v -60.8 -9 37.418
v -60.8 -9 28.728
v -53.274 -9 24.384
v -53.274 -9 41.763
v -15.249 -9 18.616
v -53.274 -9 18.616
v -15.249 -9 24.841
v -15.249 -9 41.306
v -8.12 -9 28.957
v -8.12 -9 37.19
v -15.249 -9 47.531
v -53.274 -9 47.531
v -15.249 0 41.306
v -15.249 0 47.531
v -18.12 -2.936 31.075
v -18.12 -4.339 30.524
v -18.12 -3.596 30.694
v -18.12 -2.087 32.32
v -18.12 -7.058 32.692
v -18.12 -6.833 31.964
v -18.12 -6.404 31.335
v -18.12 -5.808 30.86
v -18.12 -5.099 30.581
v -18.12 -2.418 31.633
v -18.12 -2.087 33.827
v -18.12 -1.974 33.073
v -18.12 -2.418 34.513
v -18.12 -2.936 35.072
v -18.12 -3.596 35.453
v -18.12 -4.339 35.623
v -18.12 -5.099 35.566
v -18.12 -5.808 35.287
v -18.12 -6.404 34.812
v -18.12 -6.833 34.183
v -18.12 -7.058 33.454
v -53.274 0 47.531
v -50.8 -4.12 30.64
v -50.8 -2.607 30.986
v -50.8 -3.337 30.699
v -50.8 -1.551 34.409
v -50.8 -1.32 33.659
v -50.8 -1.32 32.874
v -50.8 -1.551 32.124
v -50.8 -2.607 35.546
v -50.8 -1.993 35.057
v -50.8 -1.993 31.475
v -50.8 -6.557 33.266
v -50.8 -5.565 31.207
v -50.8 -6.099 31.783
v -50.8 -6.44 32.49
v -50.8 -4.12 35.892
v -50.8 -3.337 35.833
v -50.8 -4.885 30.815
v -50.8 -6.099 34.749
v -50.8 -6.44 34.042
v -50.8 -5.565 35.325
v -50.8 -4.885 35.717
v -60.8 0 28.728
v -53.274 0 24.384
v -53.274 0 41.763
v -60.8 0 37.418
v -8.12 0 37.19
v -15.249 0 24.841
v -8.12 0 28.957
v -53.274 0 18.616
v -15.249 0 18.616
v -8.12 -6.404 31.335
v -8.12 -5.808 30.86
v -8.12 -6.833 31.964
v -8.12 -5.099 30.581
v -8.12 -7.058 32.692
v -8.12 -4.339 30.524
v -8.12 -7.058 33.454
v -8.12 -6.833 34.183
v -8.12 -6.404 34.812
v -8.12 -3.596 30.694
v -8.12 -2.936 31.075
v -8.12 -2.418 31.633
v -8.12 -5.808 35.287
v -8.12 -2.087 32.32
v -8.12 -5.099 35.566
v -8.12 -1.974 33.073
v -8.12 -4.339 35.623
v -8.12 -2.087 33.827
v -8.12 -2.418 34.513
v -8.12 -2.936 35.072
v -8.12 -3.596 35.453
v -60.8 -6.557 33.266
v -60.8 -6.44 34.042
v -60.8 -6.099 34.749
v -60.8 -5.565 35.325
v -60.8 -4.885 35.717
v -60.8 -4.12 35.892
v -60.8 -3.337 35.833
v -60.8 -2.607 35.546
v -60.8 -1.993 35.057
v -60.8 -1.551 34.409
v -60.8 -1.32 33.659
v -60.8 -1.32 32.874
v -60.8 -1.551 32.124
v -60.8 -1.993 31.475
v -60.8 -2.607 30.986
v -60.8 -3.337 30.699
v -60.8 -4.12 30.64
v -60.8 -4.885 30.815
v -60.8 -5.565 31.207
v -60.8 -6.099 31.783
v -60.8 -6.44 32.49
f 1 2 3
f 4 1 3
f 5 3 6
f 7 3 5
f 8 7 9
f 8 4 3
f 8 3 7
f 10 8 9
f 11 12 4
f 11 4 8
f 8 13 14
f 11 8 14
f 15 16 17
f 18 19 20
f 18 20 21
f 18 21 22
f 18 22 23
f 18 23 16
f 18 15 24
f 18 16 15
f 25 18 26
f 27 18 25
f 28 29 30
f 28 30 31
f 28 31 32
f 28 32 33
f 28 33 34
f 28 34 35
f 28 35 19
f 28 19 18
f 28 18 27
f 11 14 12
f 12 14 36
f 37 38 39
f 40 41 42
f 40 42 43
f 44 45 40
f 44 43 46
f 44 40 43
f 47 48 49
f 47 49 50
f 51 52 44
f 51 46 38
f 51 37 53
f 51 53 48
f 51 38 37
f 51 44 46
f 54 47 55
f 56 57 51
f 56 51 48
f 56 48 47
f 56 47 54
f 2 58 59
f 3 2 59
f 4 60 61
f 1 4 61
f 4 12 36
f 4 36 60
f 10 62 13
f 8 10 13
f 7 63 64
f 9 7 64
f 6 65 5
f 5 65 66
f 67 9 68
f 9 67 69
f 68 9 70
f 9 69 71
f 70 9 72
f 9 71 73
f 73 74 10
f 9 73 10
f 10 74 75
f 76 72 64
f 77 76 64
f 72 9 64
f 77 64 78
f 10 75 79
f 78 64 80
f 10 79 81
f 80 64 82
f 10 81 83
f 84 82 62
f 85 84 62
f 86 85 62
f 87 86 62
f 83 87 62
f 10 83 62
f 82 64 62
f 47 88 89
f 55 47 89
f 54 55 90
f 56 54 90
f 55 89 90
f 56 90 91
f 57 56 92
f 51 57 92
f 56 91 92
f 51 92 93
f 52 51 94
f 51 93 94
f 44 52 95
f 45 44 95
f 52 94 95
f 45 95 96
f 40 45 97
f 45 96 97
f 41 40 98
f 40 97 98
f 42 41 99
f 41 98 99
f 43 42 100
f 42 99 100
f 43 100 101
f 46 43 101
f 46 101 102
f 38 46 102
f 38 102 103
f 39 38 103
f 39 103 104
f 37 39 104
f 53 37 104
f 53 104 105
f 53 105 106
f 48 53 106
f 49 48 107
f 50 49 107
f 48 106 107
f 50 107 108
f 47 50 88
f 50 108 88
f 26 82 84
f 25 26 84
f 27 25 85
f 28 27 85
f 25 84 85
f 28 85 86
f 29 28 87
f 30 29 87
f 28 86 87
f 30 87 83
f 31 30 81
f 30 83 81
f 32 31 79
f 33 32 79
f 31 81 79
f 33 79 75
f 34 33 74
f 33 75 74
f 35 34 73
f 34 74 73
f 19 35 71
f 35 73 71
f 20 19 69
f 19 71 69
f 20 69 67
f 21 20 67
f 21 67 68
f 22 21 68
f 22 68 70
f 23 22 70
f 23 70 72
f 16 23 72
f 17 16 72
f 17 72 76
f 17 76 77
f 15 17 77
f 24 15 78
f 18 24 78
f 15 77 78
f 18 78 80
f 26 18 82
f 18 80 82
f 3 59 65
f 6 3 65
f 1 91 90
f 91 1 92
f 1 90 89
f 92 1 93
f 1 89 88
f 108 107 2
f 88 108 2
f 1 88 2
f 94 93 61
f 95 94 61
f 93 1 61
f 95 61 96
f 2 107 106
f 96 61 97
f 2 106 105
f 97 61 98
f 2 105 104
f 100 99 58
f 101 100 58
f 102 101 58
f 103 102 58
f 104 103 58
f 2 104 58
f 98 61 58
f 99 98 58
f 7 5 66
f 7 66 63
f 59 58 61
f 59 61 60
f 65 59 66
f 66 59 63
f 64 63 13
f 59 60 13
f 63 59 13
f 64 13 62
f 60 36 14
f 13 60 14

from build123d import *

# Parameters (mm, degrees)
F1_DEPTH = 9
F2_R     = 2.5563686672
F4_DEPTH = 10
F3_R     = 2.6331489766
F5_DEPTH = 10


with BuildPart() as f1:
    # F0 (on Front) → F1 (new body)
    with BuildSketch(Plane.XZ):
        Polygon((-15.2494329959, 47.5306976587), (-53.273987025, 47.5306976587), (-53.273987025, 41.7633611672), (-45.7482971251, 37.4184020777), (-45.7482971251, 28.7284838985), (-53.273987025, 24.383524809), (-53.273987025, 18.6161883175), (-15.2494329959, 18.6161883175), (-15.2494329959, 24.8408854145), (-22.3790369928, 28.9571642013), (-22.3790369928, 37.1897217749), (-15.2494329959, 41.3060005617), align=None)
        Polygon((-45.7482971251, 37.4184020777), (-53.273987025, 41.7633611672), (-53.273987025, 24.383524809), (-45.7482971251, 28.7284838985), align=None)
        Polygon((-53.273987025, 24.383524809), (-53.273987025, 41.7633611672), (-60.7996769249, 37.4184020777), (-60.7996769249, 28.7284838985), align=None)
        Polygon((-8.119828999, 37.1897217749), (-15.2494329959, 41.3060005617), (-15.2494329959, 24.8408854145), (-8.119828999, 28.9571642013), align=None)
        Polygon((-15.2494329959, 24.8408854145), (-15.2494329959, 41.3060005617), (-22.3790369928, 37.1897217749), (-22.3790369928, 28.9571642013), align=None)
    extrude(amount=F1_DEPTH)

    # F2 (on face) → F4 (cut)
    with BuildSketch(Plane.YZ.offset(-8.119828999)):
        with Locations((-4.5300060883, 33.0734429881)):
            Circle(F2_R)
    extrude(amount=-F4_DEPTH, mode=Mode.SUBTRACT)

    # F3 (on face) → F5 (cut)
    with BuildSketch(Plane(origin=(-60.7996769249, 0, 0), x_dir=(0, -1, 0), z_dir=(-1, 0, 0))):
        with Locations((3.9233877324, 33.2661084831)):
            Circle(F3_R)
    extrude(amount=-F5_DEPTH, mode=Mode.SUBTRACT)


solid = f1.part
